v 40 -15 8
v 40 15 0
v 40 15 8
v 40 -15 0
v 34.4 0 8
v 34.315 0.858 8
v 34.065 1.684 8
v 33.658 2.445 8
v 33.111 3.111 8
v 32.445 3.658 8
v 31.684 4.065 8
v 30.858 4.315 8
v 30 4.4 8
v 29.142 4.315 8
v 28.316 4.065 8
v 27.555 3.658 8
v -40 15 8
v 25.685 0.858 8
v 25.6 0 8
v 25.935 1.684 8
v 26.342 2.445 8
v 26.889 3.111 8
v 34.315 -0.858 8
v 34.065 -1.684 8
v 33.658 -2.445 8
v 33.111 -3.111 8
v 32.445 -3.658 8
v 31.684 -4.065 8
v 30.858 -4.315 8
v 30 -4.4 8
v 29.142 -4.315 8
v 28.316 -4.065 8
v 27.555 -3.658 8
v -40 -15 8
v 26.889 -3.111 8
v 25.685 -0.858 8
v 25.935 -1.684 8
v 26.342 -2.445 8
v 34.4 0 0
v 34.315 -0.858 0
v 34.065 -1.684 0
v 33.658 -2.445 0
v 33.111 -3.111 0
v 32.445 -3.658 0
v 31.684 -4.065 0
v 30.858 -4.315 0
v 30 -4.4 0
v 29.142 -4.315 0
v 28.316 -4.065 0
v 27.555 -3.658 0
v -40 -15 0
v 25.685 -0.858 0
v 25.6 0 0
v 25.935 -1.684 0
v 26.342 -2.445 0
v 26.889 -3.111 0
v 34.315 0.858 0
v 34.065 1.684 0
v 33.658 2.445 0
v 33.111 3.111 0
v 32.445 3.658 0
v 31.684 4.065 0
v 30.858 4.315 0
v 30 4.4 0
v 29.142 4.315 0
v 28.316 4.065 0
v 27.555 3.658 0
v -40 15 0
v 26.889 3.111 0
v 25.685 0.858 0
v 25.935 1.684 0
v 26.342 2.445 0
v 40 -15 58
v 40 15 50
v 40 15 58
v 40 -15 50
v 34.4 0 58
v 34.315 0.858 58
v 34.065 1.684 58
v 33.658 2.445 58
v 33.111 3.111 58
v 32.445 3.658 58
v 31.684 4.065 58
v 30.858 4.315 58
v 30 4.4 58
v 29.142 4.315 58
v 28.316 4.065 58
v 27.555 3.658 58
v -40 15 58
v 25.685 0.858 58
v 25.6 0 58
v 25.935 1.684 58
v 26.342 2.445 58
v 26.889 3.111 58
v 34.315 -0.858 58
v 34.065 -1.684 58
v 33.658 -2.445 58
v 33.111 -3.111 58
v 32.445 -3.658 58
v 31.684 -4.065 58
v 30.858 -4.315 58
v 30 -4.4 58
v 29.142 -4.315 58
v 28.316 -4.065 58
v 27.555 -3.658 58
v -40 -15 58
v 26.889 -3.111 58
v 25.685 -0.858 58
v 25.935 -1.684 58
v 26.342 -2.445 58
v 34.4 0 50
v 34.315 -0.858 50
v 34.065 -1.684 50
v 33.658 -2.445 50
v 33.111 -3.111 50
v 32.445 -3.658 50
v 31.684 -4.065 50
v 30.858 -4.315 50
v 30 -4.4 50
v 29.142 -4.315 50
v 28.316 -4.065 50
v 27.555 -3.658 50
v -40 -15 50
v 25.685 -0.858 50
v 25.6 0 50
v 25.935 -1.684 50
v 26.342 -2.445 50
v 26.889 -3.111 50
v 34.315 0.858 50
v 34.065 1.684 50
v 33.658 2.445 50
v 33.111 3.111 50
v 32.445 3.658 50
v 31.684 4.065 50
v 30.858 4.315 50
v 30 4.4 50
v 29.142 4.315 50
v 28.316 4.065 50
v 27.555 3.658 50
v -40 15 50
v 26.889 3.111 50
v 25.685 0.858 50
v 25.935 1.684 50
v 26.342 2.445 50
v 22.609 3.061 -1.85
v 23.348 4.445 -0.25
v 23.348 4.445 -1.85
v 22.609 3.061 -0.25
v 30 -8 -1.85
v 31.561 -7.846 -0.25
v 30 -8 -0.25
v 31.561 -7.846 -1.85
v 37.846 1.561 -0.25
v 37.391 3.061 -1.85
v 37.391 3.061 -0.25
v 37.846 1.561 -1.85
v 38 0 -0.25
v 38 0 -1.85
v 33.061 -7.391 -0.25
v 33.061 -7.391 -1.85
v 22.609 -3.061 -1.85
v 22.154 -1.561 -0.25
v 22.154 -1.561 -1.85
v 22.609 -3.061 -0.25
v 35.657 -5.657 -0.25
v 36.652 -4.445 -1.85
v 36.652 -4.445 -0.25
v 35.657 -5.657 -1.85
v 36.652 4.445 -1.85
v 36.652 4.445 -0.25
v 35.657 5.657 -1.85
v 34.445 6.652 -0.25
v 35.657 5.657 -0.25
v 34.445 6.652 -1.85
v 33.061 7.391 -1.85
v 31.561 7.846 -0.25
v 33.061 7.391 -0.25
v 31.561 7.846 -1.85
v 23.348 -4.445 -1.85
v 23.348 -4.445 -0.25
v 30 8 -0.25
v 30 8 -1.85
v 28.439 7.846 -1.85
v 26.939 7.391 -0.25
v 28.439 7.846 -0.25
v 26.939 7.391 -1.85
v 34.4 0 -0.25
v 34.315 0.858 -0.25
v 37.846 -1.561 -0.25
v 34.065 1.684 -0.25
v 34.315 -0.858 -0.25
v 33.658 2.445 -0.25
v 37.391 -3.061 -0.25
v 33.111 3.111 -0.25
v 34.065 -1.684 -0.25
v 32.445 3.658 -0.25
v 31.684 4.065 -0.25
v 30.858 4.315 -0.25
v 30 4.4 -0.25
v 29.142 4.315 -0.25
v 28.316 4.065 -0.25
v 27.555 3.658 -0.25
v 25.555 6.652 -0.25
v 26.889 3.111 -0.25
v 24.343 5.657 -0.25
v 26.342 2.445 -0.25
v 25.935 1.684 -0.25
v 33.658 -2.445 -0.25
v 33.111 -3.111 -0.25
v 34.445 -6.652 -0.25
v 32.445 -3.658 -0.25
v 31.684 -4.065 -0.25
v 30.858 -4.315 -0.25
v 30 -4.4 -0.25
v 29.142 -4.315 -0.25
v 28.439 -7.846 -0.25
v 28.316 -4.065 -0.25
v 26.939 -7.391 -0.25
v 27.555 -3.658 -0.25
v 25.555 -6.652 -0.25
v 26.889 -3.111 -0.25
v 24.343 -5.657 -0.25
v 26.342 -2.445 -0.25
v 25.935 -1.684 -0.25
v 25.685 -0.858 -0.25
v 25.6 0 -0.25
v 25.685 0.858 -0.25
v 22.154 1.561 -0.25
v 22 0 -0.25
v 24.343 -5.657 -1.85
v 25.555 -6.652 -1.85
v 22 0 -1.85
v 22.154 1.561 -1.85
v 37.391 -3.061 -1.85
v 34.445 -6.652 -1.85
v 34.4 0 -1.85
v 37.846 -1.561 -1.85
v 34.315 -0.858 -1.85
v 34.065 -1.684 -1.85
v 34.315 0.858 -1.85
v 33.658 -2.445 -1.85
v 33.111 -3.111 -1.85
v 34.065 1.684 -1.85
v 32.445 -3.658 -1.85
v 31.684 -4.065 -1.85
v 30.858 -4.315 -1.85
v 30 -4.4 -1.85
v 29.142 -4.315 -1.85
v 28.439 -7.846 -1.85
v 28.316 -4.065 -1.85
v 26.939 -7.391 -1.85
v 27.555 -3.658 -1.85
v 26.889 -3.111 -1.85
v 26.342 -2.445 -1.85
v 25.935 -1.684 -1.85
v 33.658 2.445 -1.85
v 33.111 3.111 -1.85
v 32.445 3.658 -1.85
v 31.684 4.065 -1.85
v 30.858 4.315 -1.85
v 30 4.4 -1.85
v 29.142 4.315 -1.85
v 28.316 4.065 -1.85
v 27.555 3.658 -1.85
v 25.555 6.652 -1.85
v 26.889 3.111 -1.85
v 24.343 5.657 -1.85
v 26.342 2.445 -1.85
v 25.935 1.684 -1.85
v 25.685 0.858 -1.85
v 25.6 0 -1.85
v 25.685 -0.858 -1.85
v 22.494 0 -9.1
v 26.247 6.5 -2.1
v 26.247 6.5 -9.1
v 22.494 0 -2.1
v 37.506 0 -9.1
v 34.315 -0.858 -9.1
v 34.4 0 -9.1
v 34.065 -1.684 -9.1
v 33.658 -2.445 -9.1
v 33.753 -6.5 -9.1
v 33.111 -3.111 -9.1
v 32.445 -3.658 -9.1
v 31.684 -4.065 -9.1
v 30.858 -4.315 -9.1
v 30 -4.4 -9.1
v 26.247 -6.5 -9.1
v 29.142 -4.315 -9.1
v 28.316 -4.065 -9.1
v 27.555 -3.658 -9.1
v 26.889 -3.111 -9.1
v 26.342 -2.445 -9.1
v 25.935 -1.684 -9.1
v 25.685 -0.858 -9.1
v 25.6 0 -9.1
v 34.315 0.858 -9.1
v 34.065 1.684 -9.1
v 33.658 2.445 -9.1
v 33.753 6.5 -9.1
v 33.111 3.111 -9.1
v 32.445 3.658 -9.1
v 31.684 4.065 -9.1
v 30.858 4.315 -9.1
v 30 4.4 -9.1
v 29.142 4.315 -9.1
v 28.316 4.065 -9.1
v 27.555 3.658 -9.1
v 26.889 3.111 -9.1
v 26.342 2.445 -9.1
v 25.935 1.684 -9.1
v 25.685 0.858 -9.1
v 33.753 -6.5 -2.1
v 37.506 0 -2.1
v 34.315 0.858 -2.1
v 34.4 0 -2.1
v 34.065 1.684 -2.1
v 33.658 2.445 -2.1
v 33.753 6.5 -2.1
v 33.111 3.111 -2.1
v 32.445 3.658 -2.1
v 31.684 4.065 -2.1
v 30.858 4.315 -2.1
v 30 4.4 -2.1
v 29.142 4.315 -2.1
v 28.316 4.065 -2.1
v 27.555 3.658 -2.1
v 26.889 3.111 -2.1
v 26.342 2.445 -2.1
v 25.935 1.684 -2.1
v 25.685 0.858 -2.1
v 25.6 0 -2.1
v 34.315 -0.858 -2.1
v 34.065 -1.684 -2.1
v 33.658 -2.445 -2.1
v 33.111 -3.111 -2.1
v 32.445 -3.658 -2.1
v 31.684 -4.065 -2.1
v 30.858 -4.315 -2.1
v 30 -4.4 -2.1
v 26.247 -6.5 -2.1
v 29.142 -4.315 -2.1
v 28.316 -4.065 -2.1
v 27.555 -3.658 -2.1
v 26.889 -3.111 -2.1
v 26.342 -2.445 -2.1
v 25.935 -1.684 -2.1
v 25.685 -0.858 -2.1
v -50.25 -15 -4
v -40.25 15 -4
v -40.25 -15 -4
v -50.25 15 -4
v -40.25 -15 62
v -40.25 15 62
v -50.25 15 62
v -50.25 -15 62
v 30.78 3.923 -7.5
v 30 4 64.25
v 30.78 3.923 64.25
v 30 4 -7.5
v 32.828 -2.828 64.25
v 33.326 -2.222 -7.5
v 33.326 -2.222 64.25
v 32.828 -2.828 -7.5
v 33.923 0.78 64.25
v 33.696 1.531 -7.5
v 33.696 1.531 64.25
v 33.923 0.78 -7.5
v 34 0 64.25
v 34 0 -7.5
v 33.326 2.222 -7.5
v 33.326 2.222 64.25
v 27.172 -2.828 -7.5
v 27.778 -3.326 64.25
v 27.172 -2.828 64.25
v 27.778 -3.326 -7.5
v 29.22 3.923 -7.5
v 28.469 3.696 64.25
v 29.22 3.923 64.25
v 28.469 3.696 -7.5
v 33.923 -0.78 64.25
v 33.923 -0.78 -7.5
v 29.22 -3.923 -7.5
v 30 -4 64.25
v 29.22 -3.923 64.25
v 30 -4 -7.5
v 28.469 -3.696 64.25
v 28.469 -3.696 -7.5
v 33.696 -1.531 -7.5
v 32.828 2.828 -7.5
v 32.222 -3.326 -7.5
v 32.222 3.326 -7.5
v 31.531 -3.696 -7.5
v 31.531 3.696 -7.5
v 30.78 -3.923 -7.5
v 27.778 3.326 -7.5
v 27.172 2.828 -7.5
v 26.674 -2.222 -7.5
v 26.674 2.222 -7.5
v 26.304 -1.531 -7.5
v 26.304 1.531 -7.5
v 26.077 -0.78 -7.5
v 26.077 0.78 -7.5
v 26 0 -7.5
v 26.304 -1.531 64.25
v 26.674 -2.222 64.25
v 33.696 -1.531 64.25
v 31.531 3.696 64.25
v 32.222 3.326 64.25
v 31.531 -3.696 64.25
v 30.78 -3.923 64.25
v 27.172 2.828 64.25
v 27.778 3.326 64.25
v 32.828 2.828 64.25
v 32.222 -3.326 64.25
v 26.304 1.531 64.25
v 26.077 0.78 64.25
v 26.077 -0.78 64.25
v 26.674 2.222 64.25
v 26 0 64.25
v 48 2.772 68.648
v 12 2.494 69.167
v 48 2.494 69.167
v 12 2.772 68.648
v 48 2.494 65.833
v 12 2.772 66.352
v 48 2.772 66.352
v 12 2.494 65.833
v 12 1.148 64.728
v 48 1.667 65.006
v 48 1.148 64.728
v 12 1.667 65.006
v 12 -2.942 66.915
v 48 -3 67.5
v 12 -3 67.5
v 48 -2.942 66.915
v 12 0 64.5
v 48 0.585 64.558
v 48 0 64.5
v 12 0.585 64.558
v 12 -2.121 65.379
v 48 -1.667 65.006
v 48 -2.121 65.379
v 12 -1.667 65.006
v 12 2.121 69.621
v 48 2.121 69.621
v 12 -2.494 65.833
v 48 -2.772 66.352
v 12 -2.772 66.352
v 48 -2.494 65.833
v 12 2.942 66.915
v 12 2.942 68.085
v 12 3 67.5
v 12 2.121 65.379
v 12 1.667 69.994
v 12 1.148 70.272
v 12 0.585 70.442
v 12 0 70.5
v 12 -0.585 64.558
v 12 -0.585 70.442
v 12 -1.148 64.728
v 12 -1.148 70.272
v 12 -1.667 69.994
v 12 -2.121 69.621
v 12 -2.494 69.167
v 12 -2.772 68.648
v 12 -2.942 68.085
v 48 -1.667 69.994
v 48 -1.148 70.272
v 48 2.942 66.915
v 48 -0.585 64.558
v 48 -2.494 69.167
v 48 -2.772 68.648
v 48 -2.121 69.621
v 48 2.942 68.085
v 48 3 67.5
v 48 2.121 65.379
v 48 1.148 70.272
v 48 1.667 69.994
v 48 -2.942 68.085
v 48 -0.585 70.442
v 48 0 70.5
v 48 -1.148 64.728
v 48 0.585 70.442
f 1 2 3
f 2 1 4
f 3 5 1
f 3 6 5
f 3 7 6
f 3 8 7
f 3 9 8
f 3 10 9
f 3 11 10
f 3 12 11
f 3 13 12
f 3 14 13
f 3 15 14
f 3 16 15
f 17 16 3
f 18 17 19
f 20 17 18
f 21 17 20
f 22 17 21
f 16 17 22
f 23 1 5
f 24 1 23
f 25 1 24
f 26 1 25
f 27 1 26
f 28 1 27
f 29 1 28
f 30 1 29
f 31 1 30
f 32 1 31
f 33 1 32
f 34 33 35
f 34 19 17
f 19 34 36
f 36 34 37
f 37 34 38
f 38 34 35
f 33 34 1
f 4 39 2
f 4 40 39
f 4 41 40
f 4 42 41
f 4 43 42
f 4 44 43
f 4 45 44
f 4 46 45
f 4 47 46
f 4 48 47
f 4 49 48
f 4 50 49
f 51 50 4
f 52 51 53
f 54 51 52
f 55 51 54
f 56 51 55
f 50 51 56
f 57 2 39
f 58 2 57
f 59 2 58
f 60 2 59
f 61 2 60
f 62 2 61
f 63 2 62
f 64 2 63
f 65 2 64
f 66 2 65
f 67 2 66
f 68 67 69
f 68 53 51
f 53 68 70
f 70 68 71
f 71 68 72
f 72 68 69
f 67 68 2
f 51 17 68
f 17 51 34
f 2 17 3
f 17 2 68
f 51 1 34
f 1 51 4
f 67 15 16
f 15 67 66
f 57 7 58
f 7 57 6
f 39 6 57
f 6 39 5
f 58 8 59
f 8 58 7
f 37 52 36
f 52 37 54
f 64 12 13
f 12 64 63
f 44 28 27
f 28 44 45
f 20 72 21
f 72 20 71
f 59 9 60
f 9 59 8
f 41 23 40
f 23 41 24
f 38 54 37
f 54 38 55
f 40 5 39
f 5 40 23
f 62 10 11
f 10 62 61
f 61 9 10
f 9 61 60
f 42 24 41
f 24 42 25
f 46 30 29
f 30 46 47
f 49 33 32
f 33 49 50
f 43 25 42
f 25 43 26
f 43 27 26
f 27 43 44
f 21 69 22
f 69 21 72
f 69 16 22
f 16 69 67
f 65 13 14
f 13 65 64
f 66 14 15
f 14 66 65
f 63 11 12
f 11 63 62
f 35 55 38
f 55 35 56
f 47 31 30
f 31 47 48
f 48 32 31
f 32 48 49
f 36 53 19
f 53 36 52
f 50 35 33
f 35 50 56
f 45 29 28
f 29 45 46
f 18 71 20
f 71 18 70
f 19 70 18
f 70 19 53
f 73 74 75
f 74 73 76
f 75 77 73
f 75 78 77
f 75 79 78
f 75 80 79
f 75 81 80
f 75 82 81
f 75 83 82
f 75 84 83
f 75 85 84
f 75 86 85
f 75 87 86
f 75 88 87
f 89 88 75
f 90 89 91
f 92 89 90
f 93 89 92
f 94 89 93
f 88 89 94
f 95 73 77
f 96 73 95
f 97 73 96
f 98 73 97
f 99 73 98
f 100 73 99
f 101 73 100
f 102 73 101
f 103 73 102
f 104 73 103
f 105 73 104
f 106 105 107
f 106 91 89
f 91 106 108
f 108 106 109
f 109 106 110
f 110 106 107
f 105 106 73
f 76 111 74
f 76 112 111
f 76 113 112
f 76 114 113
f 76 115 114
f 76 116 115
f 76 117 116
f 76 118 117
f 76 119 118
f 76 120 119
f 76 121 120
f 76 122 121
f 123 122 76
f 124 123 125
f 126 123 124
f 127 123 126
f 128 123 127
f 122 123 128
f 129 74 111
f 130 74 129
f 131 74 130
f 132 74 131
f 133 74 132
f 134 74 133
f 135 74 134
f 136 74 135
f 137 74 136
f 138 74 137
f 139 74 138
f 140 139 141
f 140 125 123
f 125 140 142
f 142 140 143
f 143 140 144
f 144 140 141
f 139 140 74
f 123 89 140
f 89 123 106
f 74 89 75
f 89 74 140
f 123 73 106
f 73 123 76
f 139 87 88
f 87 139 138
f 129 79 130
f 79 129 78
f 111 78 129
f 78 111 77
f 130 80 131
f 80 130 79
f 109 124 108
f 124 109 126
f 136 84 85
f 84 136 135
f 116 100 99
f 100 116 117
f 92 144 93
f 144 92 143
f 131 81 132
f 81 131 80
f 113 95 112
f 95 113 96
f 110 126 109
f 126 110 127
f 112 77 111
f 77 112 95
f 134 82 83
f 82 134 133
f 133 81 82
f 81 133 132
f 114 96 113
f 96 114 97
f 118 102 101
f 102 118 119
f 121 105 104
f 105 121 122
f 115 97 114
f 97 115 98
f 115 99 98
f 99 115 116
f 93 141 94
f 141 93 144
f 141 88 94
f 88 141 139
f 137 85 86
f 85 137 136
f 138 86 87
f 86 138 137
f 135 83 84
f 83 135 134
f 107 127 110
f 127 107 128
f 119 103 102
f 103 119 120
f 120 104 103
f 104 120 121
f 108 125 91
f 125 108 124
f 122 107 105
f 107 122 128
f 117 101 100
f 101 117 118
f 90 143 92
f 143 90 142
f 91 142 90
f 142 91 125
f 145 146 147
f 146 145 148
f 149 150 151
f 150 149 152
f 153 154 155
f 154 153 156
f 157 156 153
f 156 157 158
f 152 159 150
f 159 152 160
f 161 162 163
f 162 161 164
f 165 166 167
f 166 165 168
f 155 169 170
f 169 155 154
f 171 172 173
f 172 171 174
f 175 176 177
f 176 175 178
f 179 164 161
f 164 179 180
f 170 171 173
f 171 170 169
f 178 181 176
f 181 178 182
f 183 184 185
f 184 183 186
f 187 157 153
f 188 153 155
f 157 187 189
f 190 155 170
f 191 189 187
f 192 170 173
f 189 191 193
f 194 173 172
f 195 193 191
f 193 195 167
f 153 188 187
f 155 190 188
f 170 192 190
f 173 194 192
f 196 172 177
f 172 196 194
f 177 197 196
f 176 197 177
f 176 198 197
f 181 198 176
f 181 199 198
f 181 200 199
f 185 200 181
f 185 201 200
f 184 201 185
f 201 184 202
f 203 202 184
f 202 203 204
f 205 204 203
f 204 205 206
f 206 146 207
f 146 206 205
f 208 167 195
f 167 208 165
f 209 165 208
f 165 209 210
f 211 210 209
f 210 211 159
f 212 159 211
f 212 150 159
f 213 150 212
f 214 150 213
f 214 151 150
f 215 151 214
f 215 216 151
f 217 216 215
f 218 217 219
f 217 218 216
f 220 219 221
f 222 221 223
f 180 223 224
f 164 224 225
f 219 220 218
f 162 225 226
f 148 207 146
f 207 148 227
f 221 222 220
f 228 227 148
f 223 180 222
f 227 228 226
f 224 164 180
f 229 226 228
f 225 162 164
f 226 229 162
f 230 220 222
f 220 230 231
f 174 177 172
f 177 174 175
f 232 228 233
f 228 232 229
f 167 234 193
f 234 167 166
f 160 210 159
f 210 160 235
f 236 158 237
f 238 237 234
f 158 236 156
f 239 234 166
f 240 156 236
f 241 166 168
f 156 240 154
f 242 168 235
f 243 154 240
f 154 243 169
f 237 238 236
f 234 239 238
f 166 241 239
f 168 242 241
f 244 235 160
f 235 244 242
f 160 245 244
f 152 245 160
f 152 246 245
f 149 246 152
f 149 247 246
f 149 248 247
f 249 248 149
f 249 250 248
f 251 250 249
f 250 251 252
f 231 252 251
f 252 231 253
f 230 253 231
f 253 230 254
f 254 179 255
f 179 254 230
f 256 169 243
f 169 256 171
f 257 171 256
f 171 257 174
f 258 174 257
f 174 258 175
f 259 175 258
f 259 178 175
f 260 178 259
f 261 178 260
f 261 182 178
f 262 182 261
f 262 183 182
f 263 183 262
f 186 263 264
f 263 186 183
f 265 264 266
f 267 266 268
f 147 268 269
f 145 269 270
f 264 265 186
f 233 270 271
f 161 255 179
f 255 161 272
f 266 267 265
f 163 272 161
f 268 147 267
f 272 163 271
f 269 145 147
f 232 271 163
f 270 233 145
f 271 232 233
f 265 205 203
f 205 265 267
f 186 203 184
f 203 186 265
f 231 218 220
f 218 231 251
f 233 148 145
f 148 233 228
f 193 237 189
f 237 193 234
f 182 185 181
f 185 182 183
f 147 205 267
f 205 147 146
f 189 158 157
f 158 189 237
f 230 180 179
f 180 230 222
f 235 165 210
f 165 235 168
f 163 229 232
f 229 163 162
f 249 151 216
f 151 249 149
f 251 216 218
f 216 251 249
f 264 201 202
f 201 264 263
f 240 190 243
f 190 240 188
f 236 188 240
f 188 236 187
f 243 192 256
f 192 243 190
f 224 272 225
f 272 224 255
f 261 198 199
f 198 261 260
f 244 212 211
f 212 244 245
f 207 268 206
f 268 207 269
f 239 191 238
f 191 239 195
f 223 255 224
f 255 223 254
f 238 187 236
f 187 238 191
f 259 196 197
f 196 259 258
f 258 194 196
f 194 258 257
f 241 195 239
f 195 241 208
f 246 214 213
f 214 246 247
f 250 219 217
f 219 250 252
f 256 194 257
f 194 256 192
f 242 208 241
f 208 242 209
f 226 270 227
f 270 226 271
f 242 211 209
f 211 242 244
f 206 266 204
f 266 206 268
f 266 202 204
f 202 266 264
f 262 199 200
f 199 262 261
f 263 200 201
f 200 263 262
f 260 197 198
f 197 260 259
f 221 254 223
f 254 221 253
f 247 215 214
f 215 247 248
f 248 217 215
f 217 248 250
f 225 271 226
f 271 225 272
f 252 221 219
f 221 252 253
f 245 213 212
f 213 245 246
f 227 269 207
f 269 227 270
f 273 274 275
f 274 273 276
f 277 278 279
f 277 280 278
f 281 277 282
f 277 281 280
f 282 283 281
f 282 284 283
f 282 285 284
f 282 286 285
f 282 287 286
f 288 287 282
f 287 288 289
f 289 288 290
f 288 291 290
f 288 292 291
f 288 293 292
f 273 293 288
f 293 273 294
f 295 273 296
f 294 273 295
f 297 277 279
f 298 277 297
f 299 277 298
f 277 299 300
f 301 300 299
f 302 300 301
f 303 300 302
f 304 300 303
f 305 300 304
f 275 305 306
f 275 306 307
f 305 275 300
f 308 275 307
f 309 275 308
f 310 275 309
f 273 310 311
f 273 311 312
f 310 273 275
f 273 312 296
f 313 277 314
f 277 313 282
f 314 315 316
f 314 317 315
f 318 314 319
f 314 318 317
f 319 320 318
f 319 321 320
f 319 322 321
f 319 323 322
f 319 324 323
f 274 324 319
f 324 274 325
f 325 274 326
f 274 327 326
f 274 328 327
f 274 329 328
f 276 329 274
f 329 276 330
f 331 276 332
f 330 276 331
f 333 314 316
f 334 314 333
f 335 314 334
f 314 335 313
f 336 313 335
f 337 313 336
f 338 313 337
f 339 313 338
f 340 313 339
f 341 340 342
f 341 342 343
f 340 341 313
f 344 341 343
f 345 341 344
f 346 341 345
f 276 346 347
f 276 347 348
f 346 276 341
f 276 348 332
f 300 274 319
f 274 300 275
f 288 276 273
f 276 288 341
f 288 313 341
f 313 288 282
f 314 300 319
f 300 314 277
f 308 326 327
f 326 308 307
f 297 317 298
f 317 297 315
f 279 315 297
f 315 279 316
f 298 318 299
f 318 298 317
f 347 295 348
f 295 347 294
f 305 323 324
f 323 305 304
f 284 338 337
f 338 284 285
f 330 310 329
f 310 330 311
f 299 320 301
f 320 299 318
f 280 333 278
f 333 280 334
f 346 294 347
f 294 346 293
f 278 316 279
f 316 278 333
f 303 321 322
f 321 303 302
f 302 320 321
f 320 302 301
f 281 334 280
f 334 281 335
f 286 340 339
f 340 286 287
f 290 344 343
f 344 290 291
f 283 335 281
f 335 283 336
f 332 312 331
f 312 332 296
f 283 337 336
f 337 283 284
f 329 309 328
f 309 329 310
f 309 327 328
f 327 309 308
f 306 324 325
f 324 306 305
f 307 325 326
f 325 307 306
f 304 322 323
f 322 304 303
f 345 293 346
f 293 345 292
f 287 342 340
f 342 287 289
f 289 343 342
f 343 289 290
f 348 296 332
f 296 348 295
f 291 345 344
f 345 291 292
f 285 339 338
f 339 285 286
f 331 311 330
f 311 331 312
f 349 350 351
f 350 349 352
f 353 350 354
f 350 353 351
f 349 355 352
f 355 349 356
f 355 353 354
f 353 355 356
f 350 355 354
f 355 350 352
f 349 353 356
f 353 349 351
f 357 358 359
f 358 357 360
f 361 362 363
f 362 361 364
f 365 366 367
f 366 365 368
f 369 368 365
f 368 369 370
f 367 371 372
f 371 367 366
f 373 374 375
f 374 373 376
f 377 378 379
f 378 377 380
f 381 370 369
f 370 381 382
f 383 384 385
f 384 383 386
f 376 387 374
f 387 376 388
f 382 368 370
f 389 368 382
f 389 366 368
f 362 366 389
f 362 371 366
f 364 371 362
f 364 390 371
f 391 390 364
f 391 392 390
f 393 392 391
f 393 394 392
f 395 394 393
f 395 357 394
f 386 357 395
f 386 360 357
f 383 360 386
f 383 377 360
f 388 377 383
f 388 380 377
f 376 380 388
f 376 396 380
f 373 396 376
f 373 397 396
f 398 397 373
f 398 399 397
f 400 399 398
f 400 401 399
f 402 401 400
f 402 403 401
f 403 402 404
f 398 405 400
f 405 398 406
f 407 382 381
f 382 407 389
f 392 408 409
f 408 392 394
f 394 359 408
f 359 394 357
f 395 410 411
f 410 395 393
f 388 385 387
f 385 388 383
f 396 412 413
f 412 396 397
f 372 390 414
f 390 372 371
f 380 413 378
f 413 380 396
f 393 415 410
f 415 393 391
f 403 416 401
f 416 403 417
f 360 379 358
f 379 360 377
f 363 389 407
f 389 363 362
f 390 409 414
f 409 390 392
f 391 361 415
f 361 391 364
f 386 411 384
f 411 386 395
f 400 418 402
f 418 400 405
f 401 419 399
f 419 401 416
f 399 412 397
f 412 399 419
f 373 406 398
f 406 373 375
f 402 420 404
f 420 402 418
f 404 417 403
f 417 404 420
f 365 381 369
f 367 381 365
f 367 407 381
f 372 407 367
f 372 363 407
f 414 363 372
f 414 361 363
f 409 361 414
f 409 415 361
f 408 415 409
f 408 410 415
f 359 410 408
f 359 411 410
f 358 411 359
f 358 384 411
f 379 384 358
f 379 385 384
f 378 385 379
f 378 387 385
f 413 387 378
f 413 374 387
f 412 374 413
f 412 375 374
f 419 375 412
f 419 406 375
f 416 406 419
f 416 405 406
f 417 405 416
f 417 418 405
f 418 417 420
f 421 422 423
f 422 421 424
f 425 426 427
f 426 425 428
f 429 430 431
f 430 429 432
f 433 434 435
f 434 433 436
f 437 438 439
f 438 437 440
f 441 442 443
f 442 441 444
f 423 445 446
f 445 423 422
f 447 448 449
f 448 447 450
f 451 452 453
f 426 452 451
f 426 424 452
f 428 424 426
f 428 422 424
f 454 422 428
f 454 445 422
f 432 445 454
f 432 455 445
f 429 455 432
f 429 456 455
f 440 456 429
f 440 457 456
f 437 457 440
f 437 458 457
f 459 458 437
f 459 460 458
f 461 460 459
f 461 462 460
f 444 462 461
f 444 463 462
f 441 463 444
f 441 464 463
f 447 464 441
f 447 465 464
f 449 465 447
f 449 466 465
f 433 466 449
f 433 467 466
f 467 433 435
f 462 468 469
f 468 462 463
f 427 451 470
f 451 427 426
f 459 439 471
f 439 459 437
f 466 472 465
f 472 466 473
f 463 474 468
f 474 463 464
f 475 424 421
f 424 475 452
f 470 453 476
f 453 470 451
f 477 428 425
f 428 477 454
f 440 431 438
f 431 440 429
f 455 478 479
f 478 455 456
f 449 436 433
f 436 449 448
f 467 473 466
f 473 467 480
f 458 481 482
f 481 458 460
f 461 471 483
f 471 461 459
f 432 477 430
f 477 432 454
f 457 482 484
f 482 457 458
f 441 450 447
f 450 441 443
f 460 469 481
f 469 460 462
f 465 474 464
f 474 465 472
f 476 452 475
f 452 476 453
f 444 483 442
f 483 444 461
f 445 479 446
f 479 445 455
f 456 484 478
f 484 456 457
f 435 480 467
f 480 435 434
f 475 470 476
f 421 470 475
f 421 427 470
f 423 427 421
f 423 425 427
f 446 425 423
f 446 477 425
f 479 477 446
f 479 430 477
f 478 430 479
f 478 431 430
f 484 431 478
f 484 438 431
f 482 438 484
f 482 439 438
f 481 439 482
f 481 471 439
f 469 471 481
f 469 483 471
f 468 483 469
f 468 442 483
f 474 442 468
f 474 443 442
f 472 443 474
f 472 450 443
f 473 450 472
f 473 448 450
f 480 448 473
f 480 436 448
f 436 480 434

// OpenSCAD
$fn = 32;

// ------------------------------------------------------------------------
// C clamp: throat 50 mm, screw d8
// Every part is its own module, assembly() places every instance.
// ------------------------------------------------------------------------

// --- part 1 ---
module clamp_arm() {
  difference() {
    translate([-40, -15, 0]) cube([80, 30, 8]);
    translate([30, 0, -1]) cylinder(h = 10, d = 8.8);
  }
}

// --- part 2 ---
module clamp_spine() {
  difference() {
    translate([-33, -15, 0]) cube([66, 30, 10]);
  }
}

// --- part 3 ---
module clamp_screw() {
  translate([0, 0, -35.875]) cylinder(h = 71.75, d = 8);
}

// --- part 4 ---
module clamp_washer() {
  difference() {
      translate([0, 0, 0]) cylinder(h = 1.6, d = 16);
      translate([0, 0, -1]) cylinder(h = 3.6, d = 8.8);
    }
}

// --- part 5 ---
module clamp_nut() {
  difference() {
    linear_extrude(height = 7) polygon(points = [[7.506, 0], [3.753, 6.5], [-3.753, 6.5], [-7.506, 0], [-3.753, -6.5], [3.753, -6.5]]);
    translate([0, 0, -1]) cylinder(h = 9, d = 8.8);
  }
}

// --- part 6 ---
module tommy_bar() {
  translate([0, 0, -18]) cylinder(h = 36, d = 6);
}

// --- assembly ---
module assembly() {
  color([0.80, 0.24, 0.20]) translate([0, 0, 0]) rotate([0, 0, 0]) clamp_arm();
  color([0.20, 0.45, 0.75]) translate([0, 0, 50]) rotate([0, 0, 0]) clamp_arm();
  color([0.25, 0.62, 0.32]) translate([-50.25, 0, 29]) rotate([0, 90, 0]) clamp_spine();
  color([0.92, 0.70, 0.18]) translate([30, 0, 28.375]) rotate([0, 0, 0]) clamp_screw();
  color([0.58, 0.35, 0.70]) translate([30, 0, -1.85]) rotate([0, 0, 0]) clamp_washer();
  color([0.16, 0.66, 0.66]) translate([30, 0, -9.1]) rotate([0, 0, 0]) clamp_nut();
  color([0.85, 0.48, 0.18]) translate([30, 0, 67.5]) rotate([0, 90, 0]) tommy_bar();
}

assembly();
